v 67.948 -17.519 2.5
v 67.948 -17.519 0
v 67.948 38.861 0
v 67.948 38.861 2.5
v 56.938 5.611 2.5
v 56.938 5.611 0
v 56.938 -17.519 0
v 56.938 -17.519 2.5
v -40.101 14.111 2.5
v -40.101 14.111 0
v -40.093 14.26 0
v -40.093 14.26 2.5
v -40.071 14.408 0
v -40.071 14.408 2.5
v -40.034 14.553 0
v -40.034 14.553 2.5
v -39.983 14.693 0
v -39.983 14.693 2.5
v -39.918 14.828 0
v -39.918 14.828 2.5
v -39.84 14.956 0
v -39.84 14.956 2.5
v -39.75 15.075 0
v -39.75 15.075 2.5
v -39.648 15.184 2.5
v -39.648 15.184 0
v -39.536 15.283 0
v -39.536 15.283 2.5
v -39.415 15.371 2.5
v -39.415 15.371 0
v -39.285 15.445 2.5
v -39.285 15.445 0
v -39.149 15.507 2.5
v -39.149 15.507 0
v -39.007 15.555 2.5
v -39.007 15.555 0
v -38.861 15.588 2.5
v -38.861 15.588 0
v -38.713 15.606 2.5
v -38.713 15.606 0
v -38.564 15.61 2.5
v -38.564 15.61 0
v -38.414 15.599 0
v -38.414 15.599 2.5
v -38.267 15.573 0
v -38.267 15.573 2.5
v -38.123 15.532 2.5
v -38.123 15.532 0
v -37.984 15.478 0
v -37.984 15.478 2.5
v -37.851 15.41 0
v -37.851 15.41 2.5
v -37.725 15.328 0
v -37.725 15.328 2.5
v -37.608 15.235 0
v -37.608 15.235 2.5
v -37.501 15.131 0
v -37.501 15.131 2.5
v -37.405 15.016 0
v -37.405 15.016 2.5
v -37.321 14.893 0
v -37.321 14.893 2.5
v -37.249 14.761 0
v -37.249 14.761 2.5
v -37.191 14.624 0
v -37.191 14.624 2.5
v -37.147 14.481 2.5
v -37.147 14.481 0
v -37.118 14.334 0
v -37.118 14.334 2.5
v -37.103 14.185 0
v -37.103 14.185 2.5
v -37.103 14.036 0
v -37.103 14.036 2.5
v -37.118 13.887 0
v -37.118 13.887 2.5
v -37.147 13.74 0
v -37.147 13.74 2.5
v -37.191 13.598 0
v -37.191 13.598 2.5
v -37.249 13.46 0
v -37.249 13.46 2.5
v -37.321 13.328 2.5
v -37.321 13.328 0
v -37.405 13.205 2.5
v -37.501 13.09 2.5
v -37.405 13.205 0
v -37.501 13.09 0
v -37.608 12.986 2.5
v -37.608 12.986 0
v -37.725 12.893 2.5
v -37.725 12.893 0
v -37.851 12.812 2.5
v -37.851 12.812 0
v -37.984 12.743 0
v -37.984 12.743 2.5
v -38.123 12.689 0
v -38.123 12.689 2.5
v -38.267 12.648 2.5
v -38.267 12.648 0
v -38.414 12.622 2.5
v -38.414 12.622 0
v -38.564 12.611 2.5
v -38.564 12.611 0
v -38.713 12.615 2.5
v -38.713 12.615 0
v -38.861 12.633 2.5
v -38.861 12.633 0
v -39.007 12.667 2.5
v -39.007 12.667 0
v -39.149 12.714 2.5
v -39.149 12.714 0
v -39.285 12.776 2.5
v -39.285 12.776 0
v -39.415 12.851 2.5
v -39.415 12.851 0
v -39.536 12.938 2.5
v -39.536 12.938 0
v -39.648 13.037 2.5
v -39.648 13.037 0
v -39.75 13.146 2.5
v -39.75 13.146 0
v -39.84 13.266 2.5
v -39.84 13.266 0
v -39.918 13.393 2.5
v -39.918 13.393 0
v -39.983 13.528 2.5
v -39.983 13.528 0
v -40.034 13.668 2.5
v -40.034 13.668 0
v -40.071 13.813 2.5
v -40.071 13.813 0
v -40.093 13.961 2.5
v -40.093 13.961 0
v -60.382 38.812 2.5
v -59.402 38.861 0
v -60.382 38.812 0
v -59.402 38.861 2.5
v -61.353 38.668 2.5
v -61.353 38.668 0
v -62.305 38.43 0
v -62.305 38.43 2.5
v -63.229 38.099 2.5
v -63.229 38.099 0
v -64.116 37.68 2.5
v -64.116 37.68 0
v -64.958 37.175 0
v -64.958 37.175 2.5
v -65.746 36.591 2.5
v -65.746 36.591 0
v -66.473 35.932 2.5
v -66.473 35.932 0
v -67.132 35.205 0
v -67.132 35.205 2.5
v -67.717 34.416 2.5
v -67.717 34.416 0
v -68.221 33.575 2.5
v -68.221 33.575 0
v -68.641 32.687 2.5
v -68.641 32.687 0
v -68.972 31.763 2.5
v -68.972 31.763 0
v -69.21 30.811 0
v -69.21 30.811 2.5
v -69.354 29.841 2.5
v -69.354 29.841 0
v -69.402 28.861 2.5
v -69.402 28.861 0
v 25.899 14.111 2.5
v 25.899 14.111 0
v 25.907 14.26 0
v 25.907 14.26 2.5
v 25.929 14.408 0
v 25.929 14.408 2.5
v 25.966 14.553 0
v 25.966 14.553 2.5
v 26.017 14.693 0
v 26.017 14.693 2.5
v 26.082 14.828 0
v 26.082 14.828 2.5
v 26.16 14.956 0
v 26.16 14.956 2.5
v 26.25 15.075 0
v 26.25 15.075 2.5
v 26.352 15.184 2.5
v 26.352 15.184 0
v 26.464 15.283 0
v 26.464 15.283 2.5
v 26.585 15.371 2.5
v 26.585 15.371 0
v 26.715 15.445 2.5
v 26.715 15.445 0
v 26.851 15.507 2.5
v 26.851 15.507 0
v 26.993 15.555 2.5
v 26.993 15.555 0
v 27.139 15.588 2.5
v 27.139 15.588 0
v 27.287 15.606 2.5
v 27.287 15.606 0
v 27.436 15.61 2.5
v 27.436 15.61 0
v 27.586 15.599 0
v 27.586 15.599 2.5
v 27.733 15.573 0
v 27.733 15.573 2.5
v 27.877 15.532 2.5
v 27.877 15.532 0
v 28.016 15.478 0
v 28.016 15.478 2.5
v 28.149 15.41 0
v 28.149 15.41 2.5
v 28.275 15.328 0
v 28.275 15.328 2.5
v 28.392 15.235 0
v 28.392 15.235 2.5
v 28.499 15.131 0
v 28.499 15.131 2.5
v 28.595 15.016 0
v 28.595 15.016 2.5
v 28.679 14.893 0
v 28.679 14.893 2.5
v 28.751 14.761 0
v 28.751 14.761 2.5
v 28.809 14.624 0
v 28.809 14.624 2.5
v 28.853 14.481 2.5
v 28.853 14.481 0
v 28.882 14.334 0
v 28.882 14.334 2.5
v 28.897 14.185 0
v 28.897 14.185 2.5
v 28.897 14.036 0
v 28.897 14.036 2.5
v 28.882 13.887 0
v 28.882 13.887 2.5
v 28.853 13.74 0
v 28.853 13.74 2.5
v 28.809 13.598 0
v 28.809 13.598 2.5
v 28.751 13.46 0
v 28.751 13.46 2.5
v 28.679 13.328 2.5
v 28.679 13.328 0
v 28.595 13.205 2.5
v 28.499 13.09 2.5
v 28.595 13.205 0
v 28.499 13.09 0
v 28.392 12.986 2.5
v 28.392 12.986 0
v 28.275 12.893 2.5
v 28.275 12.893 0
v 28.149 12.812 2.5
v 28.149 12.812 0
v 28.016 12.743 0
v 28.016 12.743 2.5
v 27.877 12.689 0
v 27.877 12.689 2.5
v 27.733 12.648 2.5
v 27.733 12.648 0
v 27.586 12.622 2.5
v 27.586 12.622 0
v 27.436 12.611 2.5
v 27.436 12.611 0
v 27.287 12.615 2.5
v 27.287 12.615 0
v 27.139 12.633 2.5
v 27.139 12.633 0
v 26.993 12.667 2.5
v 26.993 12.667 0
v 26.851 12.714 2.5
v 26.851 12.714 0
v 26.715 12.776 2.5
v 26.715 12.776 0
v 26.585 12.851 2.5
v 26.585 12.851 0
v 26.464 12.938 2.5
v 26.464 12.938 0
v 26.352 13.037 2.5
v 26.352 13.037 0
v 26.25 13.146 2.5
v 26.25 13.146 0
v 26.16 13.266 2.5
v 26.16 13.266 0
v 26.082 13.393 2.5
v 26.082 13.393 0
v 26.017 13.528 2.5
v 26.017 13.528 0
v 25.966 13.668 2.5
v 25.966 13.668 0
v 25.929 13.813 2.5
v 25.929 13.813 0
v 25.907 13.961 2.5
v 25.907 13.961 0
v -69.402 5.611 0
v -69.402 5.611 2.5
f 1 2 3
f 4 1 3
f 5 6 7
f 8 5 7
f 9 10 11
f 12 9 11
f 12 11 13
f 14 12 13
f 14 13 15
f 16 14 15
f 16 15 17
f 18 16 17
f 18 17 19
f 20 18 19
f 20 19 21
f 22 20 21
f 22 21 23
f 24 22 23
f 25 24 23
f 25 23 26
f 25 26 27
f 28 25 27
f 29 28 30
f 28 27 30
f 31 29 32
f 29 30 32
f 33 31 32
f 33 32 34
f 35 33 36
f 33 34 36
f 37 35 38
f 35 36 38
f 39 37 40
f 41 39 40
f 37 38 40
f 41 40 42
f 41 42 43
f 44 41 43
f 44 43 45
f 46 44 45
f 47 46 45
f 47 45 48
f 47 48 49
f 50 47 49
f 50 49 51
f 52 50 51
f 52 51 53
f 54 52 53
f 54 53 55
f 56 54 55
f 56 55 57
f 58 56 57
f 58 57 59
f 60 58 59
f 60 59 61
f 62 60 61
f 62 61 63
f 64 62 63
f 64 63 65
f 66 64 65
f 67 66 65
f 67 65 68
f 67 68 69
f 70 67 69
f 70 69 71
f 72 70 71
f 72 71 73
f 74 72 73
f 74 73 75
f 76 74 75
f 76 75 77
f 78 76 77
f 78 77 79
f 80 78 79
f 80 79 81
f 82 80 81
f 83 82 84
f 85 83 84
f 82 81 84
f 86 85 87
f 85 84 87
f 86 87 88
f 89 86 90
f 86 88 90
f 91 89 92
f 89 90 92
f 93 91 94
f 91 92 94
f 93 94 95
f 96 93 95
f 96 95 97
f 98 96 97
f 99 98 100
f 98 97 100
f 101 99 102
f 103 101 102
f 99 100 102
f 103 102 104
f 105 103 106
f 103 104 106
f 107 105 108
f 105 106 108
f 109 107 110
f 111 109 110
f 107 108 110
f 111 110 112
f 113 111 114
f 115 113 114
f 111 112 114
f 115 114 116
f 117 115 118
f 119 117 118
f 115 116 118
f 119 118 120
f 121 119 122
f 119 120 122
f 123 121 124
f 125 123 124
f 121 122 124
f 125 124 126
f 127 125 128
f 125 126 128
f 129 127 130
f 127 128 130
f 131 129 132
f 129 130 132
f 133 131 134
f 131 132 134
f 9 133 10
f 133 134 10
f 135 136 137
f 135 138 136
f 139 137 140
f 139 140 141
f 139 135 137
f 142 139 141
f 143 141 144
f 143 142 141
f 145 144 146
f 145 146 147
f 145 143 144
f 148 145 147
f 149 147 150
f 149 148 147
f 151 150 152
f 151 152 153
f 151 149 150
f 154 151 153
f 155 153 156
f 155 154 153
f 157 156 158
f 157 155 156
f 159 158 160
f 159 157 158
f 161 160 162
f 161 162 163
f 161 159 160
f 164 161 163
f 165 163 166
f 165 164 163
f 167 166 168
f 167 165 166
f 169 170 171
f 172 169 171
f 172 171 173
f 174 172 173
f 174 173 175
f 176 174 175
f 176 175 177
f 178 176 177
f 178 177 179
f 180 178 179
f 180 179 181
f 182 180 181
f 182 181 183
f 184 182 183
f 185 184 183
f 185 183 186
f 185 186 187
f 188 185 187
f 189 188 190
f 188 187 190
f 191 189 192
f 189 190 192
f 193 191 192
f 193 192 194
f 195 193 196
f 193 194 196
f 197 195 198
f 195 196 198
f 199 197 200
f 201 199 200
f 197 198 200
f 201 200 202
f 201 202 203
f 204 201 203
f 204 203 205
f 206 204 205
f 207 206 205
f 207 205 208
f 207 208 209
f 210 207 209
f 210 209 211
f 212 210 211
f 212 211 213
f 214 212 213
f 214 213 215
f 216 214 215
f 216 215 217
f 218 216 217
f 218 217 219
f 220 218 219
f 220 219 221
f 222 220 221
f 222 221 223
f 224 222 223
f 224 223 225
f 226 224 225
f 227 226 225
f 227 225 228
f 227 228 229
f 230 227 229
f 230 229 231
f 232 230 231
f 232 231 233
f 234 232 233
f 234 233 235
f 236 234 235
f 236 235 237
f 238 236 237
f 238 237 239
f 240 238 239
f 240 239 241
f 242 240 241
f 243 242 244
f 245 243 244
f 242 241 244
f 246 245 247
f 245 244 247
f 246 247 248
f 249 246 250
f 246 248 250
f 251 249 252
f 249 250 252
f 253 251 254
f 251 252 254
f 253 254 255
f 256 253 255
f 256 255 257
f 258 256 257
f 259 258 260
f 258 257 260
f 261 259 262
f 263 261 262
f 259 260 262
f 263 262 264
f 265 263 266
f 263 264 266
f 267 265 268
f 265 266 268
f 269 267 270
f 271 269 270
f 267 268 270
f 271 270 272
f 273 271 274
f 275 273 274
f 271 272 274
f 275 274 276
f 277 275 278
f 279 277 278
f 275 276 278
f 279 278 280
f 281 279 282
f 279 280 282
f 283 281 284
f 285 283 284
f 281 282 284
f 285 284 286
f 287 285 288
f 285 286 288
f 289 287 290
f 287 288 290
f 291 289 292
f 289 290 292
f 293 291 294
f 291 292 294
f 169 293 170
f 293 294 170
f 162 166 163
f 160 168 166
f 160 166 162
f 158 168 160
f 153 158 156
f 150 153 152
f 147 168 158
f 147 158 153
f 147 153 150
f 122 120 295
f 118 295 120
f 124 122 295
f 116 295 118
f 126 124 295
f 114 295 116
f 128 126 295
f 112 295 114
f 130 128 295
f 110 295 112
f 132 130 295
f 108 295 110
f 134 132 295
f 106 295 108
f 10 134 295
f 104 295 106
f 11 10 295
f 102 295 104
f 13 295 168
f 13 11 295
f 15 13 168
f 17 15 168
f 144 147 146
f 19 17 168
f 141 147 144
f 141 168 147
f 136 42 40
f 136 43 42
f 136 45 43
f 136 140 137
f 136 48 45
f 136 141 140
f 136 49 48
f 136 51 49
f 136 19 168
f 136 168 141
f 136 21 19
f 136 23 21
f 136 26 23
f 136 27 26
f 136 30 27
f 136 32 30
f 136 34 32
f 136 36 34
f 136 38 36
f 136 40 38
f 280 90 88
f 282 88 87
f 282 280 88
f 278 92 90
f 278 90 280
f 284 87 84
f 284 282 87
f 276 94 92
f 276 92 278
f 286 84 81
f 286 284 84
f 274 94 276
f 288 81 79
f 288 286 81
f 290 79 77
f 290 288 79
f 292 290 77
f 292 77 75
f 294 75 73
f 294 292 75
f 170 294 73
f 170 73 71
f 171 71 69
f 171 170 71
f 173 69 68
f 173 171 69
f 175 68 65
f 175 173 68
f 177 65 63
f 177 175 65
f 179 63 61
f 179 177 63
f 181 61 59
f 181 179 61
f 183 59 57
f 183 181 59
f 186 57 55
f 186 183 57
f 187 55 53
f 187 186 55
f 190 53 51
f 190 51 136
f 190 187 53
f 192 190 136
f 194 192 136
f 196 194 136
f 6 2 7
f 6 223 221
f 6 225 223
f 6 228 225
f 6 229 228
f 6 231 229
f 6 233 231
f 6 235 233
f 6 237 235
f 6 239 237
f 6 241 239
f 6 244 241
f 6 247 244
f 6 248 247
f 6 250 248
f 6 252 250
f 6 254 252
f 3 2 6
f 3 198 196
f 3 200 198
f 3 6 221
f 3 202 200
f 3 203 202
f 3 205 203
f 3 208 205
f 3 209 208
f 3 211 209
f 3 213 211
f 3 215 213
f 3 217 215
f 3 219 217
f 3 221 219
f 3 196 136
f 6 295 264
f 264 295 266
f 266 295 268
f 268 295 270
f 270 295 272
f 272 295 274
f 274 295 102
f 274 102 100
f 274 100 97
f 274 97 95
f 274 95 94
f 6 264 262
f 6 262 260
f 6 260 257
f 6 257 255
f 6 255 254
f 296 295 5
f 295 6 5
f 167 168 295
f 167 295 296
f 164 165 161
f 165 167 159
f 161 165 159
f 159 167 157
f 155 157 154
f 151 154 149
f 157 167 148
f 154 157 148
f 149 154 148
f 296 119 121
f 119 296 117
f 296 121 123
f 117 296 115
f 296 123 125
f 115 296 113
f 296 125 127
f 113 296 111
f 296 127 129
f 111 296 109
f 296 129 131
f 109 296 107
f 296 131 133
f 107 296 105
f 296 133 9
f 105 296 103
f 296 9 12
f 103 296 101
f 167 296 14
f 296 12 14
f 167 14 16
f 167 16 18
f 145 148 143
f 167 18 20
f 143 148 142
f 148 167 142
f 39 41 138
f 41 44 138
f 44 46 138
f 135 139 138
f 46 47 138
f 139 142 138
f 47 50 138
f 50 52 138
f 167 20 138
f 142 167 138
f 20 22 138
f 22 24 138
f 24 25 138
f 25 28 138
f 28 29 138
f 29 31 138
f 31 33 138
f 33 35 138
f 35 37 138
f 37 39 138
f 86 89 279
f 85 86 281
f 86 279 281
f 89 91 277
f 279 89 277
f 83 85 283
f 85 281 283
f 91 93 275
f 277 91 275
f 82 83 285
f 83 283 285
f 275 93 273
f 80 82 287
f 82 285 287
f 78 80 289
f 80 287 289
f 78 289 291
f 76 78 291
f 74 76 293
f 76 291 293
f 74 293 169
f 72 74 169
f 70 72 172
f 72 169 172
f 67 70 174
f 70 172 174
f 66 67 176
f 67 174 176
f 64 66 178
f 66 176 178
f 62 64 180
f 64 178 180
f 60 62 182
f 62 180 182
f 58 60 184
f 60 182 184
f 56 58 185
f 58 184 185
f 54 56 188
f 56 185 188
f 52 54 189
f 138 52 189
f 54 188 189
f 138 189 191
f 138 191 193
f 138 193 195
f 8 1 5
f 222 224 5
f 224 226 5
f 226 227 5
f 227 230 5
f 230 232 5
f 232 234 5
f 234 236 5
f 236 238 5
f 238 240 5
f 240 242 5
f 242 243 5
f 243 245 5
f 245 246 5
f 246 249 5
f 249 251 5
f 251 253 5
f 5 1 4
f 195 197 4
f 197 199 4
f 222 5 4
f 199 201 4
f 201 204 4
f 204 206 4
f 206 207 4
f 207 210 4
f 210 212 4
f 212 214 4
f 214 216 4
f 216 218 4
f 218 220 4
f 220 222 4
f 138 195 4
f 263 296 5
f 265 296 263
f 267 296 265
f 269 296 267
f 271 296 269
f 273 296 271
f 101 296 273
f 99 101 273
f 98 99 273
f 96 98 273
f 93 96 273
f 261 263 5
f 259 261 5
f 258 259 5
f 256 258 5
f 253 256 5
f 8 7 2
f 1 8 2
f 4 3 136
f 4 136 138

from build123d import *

# Parameters (mm, degrees)
BOSS_EXTRUDE1_DEPTH = 2.5
SKETCH2_R           = 1.5
CUT_EXTRUDE1_DEPTH  = 10
SKETCH3_W           = 124.34
SKETCH3_H           = 2.5
CUT_EXTRUDE2_DEPTH  = 1
SKETCH4_W           = 2.5
SKETCH4_H           = 33.25
BOSS_EXTRUDE2_DEPTH = 2
FILLET2_R           = 10


with BuildPart() as part:
    # Sketch1 → Boss-Extrude1 (new body)
    with BuildSketch(Plane.XY):
        Polygon((-67.40224359, 38.860576923), (-67.40224359, 4.610576923), (56.93775641, 4.610576923), (56.93775641, -17.519423077), (67.94775641, -17.519423077), (67.94775641, 38.860576923), align=None)
    extrude(amount=BOSS_EXTRUDE1_DEPTH)

    # Sketch2 → Cut-Extrude1 (cut)
    with BuildSketch(Plane(origin=(0, 0, 0), x_dir=(-1, 0, 0), z_dir=(0, 0, -1))):
        with Locations((-27.399068165, 14.110576923)):
            Circle(SKETCH2_R)
        with Locations((38.600931835, 14.110576923)):
            Circle(SKETCH2_R)
    extrude(amount=-CUT_EXTRUDE1_DEPTH, mode=Mode.SUBTRACT)

    # Sketch3 → Cut-Extrude2 (cut)
    with BuildSketch(Plane.XZ.offset(-4.610576923)):
        with Locations((-5.23224359, 1.25)):
            Rectangle(SKETCH3_W, SKETCH3_H)
    extrude(amount=-CUT_EXTRUDE2_DEPTH, mode=Mode.SUBTRACT)

    # Sketch4 → Boss-Extrude2 (add)
    with BuildSketch(Plane.ZY.offset(67.40224359)):
        with Locations((1.25, 22.235576923)):
            Rectangle(SKETCH4_W, SKETCH4_H)
    extrude(amount=BOSS_EXTRUDE2_DEPTH)

    # Fillet2
    fillet2_edges = [part.edges().sort_by_distance(p)[0] for p in [
        (-69.40224359, 38.860576923, 1.25),
    ]]
    fillet(fillet2_edges, radius=FILLET2_R)


solid = part.part
